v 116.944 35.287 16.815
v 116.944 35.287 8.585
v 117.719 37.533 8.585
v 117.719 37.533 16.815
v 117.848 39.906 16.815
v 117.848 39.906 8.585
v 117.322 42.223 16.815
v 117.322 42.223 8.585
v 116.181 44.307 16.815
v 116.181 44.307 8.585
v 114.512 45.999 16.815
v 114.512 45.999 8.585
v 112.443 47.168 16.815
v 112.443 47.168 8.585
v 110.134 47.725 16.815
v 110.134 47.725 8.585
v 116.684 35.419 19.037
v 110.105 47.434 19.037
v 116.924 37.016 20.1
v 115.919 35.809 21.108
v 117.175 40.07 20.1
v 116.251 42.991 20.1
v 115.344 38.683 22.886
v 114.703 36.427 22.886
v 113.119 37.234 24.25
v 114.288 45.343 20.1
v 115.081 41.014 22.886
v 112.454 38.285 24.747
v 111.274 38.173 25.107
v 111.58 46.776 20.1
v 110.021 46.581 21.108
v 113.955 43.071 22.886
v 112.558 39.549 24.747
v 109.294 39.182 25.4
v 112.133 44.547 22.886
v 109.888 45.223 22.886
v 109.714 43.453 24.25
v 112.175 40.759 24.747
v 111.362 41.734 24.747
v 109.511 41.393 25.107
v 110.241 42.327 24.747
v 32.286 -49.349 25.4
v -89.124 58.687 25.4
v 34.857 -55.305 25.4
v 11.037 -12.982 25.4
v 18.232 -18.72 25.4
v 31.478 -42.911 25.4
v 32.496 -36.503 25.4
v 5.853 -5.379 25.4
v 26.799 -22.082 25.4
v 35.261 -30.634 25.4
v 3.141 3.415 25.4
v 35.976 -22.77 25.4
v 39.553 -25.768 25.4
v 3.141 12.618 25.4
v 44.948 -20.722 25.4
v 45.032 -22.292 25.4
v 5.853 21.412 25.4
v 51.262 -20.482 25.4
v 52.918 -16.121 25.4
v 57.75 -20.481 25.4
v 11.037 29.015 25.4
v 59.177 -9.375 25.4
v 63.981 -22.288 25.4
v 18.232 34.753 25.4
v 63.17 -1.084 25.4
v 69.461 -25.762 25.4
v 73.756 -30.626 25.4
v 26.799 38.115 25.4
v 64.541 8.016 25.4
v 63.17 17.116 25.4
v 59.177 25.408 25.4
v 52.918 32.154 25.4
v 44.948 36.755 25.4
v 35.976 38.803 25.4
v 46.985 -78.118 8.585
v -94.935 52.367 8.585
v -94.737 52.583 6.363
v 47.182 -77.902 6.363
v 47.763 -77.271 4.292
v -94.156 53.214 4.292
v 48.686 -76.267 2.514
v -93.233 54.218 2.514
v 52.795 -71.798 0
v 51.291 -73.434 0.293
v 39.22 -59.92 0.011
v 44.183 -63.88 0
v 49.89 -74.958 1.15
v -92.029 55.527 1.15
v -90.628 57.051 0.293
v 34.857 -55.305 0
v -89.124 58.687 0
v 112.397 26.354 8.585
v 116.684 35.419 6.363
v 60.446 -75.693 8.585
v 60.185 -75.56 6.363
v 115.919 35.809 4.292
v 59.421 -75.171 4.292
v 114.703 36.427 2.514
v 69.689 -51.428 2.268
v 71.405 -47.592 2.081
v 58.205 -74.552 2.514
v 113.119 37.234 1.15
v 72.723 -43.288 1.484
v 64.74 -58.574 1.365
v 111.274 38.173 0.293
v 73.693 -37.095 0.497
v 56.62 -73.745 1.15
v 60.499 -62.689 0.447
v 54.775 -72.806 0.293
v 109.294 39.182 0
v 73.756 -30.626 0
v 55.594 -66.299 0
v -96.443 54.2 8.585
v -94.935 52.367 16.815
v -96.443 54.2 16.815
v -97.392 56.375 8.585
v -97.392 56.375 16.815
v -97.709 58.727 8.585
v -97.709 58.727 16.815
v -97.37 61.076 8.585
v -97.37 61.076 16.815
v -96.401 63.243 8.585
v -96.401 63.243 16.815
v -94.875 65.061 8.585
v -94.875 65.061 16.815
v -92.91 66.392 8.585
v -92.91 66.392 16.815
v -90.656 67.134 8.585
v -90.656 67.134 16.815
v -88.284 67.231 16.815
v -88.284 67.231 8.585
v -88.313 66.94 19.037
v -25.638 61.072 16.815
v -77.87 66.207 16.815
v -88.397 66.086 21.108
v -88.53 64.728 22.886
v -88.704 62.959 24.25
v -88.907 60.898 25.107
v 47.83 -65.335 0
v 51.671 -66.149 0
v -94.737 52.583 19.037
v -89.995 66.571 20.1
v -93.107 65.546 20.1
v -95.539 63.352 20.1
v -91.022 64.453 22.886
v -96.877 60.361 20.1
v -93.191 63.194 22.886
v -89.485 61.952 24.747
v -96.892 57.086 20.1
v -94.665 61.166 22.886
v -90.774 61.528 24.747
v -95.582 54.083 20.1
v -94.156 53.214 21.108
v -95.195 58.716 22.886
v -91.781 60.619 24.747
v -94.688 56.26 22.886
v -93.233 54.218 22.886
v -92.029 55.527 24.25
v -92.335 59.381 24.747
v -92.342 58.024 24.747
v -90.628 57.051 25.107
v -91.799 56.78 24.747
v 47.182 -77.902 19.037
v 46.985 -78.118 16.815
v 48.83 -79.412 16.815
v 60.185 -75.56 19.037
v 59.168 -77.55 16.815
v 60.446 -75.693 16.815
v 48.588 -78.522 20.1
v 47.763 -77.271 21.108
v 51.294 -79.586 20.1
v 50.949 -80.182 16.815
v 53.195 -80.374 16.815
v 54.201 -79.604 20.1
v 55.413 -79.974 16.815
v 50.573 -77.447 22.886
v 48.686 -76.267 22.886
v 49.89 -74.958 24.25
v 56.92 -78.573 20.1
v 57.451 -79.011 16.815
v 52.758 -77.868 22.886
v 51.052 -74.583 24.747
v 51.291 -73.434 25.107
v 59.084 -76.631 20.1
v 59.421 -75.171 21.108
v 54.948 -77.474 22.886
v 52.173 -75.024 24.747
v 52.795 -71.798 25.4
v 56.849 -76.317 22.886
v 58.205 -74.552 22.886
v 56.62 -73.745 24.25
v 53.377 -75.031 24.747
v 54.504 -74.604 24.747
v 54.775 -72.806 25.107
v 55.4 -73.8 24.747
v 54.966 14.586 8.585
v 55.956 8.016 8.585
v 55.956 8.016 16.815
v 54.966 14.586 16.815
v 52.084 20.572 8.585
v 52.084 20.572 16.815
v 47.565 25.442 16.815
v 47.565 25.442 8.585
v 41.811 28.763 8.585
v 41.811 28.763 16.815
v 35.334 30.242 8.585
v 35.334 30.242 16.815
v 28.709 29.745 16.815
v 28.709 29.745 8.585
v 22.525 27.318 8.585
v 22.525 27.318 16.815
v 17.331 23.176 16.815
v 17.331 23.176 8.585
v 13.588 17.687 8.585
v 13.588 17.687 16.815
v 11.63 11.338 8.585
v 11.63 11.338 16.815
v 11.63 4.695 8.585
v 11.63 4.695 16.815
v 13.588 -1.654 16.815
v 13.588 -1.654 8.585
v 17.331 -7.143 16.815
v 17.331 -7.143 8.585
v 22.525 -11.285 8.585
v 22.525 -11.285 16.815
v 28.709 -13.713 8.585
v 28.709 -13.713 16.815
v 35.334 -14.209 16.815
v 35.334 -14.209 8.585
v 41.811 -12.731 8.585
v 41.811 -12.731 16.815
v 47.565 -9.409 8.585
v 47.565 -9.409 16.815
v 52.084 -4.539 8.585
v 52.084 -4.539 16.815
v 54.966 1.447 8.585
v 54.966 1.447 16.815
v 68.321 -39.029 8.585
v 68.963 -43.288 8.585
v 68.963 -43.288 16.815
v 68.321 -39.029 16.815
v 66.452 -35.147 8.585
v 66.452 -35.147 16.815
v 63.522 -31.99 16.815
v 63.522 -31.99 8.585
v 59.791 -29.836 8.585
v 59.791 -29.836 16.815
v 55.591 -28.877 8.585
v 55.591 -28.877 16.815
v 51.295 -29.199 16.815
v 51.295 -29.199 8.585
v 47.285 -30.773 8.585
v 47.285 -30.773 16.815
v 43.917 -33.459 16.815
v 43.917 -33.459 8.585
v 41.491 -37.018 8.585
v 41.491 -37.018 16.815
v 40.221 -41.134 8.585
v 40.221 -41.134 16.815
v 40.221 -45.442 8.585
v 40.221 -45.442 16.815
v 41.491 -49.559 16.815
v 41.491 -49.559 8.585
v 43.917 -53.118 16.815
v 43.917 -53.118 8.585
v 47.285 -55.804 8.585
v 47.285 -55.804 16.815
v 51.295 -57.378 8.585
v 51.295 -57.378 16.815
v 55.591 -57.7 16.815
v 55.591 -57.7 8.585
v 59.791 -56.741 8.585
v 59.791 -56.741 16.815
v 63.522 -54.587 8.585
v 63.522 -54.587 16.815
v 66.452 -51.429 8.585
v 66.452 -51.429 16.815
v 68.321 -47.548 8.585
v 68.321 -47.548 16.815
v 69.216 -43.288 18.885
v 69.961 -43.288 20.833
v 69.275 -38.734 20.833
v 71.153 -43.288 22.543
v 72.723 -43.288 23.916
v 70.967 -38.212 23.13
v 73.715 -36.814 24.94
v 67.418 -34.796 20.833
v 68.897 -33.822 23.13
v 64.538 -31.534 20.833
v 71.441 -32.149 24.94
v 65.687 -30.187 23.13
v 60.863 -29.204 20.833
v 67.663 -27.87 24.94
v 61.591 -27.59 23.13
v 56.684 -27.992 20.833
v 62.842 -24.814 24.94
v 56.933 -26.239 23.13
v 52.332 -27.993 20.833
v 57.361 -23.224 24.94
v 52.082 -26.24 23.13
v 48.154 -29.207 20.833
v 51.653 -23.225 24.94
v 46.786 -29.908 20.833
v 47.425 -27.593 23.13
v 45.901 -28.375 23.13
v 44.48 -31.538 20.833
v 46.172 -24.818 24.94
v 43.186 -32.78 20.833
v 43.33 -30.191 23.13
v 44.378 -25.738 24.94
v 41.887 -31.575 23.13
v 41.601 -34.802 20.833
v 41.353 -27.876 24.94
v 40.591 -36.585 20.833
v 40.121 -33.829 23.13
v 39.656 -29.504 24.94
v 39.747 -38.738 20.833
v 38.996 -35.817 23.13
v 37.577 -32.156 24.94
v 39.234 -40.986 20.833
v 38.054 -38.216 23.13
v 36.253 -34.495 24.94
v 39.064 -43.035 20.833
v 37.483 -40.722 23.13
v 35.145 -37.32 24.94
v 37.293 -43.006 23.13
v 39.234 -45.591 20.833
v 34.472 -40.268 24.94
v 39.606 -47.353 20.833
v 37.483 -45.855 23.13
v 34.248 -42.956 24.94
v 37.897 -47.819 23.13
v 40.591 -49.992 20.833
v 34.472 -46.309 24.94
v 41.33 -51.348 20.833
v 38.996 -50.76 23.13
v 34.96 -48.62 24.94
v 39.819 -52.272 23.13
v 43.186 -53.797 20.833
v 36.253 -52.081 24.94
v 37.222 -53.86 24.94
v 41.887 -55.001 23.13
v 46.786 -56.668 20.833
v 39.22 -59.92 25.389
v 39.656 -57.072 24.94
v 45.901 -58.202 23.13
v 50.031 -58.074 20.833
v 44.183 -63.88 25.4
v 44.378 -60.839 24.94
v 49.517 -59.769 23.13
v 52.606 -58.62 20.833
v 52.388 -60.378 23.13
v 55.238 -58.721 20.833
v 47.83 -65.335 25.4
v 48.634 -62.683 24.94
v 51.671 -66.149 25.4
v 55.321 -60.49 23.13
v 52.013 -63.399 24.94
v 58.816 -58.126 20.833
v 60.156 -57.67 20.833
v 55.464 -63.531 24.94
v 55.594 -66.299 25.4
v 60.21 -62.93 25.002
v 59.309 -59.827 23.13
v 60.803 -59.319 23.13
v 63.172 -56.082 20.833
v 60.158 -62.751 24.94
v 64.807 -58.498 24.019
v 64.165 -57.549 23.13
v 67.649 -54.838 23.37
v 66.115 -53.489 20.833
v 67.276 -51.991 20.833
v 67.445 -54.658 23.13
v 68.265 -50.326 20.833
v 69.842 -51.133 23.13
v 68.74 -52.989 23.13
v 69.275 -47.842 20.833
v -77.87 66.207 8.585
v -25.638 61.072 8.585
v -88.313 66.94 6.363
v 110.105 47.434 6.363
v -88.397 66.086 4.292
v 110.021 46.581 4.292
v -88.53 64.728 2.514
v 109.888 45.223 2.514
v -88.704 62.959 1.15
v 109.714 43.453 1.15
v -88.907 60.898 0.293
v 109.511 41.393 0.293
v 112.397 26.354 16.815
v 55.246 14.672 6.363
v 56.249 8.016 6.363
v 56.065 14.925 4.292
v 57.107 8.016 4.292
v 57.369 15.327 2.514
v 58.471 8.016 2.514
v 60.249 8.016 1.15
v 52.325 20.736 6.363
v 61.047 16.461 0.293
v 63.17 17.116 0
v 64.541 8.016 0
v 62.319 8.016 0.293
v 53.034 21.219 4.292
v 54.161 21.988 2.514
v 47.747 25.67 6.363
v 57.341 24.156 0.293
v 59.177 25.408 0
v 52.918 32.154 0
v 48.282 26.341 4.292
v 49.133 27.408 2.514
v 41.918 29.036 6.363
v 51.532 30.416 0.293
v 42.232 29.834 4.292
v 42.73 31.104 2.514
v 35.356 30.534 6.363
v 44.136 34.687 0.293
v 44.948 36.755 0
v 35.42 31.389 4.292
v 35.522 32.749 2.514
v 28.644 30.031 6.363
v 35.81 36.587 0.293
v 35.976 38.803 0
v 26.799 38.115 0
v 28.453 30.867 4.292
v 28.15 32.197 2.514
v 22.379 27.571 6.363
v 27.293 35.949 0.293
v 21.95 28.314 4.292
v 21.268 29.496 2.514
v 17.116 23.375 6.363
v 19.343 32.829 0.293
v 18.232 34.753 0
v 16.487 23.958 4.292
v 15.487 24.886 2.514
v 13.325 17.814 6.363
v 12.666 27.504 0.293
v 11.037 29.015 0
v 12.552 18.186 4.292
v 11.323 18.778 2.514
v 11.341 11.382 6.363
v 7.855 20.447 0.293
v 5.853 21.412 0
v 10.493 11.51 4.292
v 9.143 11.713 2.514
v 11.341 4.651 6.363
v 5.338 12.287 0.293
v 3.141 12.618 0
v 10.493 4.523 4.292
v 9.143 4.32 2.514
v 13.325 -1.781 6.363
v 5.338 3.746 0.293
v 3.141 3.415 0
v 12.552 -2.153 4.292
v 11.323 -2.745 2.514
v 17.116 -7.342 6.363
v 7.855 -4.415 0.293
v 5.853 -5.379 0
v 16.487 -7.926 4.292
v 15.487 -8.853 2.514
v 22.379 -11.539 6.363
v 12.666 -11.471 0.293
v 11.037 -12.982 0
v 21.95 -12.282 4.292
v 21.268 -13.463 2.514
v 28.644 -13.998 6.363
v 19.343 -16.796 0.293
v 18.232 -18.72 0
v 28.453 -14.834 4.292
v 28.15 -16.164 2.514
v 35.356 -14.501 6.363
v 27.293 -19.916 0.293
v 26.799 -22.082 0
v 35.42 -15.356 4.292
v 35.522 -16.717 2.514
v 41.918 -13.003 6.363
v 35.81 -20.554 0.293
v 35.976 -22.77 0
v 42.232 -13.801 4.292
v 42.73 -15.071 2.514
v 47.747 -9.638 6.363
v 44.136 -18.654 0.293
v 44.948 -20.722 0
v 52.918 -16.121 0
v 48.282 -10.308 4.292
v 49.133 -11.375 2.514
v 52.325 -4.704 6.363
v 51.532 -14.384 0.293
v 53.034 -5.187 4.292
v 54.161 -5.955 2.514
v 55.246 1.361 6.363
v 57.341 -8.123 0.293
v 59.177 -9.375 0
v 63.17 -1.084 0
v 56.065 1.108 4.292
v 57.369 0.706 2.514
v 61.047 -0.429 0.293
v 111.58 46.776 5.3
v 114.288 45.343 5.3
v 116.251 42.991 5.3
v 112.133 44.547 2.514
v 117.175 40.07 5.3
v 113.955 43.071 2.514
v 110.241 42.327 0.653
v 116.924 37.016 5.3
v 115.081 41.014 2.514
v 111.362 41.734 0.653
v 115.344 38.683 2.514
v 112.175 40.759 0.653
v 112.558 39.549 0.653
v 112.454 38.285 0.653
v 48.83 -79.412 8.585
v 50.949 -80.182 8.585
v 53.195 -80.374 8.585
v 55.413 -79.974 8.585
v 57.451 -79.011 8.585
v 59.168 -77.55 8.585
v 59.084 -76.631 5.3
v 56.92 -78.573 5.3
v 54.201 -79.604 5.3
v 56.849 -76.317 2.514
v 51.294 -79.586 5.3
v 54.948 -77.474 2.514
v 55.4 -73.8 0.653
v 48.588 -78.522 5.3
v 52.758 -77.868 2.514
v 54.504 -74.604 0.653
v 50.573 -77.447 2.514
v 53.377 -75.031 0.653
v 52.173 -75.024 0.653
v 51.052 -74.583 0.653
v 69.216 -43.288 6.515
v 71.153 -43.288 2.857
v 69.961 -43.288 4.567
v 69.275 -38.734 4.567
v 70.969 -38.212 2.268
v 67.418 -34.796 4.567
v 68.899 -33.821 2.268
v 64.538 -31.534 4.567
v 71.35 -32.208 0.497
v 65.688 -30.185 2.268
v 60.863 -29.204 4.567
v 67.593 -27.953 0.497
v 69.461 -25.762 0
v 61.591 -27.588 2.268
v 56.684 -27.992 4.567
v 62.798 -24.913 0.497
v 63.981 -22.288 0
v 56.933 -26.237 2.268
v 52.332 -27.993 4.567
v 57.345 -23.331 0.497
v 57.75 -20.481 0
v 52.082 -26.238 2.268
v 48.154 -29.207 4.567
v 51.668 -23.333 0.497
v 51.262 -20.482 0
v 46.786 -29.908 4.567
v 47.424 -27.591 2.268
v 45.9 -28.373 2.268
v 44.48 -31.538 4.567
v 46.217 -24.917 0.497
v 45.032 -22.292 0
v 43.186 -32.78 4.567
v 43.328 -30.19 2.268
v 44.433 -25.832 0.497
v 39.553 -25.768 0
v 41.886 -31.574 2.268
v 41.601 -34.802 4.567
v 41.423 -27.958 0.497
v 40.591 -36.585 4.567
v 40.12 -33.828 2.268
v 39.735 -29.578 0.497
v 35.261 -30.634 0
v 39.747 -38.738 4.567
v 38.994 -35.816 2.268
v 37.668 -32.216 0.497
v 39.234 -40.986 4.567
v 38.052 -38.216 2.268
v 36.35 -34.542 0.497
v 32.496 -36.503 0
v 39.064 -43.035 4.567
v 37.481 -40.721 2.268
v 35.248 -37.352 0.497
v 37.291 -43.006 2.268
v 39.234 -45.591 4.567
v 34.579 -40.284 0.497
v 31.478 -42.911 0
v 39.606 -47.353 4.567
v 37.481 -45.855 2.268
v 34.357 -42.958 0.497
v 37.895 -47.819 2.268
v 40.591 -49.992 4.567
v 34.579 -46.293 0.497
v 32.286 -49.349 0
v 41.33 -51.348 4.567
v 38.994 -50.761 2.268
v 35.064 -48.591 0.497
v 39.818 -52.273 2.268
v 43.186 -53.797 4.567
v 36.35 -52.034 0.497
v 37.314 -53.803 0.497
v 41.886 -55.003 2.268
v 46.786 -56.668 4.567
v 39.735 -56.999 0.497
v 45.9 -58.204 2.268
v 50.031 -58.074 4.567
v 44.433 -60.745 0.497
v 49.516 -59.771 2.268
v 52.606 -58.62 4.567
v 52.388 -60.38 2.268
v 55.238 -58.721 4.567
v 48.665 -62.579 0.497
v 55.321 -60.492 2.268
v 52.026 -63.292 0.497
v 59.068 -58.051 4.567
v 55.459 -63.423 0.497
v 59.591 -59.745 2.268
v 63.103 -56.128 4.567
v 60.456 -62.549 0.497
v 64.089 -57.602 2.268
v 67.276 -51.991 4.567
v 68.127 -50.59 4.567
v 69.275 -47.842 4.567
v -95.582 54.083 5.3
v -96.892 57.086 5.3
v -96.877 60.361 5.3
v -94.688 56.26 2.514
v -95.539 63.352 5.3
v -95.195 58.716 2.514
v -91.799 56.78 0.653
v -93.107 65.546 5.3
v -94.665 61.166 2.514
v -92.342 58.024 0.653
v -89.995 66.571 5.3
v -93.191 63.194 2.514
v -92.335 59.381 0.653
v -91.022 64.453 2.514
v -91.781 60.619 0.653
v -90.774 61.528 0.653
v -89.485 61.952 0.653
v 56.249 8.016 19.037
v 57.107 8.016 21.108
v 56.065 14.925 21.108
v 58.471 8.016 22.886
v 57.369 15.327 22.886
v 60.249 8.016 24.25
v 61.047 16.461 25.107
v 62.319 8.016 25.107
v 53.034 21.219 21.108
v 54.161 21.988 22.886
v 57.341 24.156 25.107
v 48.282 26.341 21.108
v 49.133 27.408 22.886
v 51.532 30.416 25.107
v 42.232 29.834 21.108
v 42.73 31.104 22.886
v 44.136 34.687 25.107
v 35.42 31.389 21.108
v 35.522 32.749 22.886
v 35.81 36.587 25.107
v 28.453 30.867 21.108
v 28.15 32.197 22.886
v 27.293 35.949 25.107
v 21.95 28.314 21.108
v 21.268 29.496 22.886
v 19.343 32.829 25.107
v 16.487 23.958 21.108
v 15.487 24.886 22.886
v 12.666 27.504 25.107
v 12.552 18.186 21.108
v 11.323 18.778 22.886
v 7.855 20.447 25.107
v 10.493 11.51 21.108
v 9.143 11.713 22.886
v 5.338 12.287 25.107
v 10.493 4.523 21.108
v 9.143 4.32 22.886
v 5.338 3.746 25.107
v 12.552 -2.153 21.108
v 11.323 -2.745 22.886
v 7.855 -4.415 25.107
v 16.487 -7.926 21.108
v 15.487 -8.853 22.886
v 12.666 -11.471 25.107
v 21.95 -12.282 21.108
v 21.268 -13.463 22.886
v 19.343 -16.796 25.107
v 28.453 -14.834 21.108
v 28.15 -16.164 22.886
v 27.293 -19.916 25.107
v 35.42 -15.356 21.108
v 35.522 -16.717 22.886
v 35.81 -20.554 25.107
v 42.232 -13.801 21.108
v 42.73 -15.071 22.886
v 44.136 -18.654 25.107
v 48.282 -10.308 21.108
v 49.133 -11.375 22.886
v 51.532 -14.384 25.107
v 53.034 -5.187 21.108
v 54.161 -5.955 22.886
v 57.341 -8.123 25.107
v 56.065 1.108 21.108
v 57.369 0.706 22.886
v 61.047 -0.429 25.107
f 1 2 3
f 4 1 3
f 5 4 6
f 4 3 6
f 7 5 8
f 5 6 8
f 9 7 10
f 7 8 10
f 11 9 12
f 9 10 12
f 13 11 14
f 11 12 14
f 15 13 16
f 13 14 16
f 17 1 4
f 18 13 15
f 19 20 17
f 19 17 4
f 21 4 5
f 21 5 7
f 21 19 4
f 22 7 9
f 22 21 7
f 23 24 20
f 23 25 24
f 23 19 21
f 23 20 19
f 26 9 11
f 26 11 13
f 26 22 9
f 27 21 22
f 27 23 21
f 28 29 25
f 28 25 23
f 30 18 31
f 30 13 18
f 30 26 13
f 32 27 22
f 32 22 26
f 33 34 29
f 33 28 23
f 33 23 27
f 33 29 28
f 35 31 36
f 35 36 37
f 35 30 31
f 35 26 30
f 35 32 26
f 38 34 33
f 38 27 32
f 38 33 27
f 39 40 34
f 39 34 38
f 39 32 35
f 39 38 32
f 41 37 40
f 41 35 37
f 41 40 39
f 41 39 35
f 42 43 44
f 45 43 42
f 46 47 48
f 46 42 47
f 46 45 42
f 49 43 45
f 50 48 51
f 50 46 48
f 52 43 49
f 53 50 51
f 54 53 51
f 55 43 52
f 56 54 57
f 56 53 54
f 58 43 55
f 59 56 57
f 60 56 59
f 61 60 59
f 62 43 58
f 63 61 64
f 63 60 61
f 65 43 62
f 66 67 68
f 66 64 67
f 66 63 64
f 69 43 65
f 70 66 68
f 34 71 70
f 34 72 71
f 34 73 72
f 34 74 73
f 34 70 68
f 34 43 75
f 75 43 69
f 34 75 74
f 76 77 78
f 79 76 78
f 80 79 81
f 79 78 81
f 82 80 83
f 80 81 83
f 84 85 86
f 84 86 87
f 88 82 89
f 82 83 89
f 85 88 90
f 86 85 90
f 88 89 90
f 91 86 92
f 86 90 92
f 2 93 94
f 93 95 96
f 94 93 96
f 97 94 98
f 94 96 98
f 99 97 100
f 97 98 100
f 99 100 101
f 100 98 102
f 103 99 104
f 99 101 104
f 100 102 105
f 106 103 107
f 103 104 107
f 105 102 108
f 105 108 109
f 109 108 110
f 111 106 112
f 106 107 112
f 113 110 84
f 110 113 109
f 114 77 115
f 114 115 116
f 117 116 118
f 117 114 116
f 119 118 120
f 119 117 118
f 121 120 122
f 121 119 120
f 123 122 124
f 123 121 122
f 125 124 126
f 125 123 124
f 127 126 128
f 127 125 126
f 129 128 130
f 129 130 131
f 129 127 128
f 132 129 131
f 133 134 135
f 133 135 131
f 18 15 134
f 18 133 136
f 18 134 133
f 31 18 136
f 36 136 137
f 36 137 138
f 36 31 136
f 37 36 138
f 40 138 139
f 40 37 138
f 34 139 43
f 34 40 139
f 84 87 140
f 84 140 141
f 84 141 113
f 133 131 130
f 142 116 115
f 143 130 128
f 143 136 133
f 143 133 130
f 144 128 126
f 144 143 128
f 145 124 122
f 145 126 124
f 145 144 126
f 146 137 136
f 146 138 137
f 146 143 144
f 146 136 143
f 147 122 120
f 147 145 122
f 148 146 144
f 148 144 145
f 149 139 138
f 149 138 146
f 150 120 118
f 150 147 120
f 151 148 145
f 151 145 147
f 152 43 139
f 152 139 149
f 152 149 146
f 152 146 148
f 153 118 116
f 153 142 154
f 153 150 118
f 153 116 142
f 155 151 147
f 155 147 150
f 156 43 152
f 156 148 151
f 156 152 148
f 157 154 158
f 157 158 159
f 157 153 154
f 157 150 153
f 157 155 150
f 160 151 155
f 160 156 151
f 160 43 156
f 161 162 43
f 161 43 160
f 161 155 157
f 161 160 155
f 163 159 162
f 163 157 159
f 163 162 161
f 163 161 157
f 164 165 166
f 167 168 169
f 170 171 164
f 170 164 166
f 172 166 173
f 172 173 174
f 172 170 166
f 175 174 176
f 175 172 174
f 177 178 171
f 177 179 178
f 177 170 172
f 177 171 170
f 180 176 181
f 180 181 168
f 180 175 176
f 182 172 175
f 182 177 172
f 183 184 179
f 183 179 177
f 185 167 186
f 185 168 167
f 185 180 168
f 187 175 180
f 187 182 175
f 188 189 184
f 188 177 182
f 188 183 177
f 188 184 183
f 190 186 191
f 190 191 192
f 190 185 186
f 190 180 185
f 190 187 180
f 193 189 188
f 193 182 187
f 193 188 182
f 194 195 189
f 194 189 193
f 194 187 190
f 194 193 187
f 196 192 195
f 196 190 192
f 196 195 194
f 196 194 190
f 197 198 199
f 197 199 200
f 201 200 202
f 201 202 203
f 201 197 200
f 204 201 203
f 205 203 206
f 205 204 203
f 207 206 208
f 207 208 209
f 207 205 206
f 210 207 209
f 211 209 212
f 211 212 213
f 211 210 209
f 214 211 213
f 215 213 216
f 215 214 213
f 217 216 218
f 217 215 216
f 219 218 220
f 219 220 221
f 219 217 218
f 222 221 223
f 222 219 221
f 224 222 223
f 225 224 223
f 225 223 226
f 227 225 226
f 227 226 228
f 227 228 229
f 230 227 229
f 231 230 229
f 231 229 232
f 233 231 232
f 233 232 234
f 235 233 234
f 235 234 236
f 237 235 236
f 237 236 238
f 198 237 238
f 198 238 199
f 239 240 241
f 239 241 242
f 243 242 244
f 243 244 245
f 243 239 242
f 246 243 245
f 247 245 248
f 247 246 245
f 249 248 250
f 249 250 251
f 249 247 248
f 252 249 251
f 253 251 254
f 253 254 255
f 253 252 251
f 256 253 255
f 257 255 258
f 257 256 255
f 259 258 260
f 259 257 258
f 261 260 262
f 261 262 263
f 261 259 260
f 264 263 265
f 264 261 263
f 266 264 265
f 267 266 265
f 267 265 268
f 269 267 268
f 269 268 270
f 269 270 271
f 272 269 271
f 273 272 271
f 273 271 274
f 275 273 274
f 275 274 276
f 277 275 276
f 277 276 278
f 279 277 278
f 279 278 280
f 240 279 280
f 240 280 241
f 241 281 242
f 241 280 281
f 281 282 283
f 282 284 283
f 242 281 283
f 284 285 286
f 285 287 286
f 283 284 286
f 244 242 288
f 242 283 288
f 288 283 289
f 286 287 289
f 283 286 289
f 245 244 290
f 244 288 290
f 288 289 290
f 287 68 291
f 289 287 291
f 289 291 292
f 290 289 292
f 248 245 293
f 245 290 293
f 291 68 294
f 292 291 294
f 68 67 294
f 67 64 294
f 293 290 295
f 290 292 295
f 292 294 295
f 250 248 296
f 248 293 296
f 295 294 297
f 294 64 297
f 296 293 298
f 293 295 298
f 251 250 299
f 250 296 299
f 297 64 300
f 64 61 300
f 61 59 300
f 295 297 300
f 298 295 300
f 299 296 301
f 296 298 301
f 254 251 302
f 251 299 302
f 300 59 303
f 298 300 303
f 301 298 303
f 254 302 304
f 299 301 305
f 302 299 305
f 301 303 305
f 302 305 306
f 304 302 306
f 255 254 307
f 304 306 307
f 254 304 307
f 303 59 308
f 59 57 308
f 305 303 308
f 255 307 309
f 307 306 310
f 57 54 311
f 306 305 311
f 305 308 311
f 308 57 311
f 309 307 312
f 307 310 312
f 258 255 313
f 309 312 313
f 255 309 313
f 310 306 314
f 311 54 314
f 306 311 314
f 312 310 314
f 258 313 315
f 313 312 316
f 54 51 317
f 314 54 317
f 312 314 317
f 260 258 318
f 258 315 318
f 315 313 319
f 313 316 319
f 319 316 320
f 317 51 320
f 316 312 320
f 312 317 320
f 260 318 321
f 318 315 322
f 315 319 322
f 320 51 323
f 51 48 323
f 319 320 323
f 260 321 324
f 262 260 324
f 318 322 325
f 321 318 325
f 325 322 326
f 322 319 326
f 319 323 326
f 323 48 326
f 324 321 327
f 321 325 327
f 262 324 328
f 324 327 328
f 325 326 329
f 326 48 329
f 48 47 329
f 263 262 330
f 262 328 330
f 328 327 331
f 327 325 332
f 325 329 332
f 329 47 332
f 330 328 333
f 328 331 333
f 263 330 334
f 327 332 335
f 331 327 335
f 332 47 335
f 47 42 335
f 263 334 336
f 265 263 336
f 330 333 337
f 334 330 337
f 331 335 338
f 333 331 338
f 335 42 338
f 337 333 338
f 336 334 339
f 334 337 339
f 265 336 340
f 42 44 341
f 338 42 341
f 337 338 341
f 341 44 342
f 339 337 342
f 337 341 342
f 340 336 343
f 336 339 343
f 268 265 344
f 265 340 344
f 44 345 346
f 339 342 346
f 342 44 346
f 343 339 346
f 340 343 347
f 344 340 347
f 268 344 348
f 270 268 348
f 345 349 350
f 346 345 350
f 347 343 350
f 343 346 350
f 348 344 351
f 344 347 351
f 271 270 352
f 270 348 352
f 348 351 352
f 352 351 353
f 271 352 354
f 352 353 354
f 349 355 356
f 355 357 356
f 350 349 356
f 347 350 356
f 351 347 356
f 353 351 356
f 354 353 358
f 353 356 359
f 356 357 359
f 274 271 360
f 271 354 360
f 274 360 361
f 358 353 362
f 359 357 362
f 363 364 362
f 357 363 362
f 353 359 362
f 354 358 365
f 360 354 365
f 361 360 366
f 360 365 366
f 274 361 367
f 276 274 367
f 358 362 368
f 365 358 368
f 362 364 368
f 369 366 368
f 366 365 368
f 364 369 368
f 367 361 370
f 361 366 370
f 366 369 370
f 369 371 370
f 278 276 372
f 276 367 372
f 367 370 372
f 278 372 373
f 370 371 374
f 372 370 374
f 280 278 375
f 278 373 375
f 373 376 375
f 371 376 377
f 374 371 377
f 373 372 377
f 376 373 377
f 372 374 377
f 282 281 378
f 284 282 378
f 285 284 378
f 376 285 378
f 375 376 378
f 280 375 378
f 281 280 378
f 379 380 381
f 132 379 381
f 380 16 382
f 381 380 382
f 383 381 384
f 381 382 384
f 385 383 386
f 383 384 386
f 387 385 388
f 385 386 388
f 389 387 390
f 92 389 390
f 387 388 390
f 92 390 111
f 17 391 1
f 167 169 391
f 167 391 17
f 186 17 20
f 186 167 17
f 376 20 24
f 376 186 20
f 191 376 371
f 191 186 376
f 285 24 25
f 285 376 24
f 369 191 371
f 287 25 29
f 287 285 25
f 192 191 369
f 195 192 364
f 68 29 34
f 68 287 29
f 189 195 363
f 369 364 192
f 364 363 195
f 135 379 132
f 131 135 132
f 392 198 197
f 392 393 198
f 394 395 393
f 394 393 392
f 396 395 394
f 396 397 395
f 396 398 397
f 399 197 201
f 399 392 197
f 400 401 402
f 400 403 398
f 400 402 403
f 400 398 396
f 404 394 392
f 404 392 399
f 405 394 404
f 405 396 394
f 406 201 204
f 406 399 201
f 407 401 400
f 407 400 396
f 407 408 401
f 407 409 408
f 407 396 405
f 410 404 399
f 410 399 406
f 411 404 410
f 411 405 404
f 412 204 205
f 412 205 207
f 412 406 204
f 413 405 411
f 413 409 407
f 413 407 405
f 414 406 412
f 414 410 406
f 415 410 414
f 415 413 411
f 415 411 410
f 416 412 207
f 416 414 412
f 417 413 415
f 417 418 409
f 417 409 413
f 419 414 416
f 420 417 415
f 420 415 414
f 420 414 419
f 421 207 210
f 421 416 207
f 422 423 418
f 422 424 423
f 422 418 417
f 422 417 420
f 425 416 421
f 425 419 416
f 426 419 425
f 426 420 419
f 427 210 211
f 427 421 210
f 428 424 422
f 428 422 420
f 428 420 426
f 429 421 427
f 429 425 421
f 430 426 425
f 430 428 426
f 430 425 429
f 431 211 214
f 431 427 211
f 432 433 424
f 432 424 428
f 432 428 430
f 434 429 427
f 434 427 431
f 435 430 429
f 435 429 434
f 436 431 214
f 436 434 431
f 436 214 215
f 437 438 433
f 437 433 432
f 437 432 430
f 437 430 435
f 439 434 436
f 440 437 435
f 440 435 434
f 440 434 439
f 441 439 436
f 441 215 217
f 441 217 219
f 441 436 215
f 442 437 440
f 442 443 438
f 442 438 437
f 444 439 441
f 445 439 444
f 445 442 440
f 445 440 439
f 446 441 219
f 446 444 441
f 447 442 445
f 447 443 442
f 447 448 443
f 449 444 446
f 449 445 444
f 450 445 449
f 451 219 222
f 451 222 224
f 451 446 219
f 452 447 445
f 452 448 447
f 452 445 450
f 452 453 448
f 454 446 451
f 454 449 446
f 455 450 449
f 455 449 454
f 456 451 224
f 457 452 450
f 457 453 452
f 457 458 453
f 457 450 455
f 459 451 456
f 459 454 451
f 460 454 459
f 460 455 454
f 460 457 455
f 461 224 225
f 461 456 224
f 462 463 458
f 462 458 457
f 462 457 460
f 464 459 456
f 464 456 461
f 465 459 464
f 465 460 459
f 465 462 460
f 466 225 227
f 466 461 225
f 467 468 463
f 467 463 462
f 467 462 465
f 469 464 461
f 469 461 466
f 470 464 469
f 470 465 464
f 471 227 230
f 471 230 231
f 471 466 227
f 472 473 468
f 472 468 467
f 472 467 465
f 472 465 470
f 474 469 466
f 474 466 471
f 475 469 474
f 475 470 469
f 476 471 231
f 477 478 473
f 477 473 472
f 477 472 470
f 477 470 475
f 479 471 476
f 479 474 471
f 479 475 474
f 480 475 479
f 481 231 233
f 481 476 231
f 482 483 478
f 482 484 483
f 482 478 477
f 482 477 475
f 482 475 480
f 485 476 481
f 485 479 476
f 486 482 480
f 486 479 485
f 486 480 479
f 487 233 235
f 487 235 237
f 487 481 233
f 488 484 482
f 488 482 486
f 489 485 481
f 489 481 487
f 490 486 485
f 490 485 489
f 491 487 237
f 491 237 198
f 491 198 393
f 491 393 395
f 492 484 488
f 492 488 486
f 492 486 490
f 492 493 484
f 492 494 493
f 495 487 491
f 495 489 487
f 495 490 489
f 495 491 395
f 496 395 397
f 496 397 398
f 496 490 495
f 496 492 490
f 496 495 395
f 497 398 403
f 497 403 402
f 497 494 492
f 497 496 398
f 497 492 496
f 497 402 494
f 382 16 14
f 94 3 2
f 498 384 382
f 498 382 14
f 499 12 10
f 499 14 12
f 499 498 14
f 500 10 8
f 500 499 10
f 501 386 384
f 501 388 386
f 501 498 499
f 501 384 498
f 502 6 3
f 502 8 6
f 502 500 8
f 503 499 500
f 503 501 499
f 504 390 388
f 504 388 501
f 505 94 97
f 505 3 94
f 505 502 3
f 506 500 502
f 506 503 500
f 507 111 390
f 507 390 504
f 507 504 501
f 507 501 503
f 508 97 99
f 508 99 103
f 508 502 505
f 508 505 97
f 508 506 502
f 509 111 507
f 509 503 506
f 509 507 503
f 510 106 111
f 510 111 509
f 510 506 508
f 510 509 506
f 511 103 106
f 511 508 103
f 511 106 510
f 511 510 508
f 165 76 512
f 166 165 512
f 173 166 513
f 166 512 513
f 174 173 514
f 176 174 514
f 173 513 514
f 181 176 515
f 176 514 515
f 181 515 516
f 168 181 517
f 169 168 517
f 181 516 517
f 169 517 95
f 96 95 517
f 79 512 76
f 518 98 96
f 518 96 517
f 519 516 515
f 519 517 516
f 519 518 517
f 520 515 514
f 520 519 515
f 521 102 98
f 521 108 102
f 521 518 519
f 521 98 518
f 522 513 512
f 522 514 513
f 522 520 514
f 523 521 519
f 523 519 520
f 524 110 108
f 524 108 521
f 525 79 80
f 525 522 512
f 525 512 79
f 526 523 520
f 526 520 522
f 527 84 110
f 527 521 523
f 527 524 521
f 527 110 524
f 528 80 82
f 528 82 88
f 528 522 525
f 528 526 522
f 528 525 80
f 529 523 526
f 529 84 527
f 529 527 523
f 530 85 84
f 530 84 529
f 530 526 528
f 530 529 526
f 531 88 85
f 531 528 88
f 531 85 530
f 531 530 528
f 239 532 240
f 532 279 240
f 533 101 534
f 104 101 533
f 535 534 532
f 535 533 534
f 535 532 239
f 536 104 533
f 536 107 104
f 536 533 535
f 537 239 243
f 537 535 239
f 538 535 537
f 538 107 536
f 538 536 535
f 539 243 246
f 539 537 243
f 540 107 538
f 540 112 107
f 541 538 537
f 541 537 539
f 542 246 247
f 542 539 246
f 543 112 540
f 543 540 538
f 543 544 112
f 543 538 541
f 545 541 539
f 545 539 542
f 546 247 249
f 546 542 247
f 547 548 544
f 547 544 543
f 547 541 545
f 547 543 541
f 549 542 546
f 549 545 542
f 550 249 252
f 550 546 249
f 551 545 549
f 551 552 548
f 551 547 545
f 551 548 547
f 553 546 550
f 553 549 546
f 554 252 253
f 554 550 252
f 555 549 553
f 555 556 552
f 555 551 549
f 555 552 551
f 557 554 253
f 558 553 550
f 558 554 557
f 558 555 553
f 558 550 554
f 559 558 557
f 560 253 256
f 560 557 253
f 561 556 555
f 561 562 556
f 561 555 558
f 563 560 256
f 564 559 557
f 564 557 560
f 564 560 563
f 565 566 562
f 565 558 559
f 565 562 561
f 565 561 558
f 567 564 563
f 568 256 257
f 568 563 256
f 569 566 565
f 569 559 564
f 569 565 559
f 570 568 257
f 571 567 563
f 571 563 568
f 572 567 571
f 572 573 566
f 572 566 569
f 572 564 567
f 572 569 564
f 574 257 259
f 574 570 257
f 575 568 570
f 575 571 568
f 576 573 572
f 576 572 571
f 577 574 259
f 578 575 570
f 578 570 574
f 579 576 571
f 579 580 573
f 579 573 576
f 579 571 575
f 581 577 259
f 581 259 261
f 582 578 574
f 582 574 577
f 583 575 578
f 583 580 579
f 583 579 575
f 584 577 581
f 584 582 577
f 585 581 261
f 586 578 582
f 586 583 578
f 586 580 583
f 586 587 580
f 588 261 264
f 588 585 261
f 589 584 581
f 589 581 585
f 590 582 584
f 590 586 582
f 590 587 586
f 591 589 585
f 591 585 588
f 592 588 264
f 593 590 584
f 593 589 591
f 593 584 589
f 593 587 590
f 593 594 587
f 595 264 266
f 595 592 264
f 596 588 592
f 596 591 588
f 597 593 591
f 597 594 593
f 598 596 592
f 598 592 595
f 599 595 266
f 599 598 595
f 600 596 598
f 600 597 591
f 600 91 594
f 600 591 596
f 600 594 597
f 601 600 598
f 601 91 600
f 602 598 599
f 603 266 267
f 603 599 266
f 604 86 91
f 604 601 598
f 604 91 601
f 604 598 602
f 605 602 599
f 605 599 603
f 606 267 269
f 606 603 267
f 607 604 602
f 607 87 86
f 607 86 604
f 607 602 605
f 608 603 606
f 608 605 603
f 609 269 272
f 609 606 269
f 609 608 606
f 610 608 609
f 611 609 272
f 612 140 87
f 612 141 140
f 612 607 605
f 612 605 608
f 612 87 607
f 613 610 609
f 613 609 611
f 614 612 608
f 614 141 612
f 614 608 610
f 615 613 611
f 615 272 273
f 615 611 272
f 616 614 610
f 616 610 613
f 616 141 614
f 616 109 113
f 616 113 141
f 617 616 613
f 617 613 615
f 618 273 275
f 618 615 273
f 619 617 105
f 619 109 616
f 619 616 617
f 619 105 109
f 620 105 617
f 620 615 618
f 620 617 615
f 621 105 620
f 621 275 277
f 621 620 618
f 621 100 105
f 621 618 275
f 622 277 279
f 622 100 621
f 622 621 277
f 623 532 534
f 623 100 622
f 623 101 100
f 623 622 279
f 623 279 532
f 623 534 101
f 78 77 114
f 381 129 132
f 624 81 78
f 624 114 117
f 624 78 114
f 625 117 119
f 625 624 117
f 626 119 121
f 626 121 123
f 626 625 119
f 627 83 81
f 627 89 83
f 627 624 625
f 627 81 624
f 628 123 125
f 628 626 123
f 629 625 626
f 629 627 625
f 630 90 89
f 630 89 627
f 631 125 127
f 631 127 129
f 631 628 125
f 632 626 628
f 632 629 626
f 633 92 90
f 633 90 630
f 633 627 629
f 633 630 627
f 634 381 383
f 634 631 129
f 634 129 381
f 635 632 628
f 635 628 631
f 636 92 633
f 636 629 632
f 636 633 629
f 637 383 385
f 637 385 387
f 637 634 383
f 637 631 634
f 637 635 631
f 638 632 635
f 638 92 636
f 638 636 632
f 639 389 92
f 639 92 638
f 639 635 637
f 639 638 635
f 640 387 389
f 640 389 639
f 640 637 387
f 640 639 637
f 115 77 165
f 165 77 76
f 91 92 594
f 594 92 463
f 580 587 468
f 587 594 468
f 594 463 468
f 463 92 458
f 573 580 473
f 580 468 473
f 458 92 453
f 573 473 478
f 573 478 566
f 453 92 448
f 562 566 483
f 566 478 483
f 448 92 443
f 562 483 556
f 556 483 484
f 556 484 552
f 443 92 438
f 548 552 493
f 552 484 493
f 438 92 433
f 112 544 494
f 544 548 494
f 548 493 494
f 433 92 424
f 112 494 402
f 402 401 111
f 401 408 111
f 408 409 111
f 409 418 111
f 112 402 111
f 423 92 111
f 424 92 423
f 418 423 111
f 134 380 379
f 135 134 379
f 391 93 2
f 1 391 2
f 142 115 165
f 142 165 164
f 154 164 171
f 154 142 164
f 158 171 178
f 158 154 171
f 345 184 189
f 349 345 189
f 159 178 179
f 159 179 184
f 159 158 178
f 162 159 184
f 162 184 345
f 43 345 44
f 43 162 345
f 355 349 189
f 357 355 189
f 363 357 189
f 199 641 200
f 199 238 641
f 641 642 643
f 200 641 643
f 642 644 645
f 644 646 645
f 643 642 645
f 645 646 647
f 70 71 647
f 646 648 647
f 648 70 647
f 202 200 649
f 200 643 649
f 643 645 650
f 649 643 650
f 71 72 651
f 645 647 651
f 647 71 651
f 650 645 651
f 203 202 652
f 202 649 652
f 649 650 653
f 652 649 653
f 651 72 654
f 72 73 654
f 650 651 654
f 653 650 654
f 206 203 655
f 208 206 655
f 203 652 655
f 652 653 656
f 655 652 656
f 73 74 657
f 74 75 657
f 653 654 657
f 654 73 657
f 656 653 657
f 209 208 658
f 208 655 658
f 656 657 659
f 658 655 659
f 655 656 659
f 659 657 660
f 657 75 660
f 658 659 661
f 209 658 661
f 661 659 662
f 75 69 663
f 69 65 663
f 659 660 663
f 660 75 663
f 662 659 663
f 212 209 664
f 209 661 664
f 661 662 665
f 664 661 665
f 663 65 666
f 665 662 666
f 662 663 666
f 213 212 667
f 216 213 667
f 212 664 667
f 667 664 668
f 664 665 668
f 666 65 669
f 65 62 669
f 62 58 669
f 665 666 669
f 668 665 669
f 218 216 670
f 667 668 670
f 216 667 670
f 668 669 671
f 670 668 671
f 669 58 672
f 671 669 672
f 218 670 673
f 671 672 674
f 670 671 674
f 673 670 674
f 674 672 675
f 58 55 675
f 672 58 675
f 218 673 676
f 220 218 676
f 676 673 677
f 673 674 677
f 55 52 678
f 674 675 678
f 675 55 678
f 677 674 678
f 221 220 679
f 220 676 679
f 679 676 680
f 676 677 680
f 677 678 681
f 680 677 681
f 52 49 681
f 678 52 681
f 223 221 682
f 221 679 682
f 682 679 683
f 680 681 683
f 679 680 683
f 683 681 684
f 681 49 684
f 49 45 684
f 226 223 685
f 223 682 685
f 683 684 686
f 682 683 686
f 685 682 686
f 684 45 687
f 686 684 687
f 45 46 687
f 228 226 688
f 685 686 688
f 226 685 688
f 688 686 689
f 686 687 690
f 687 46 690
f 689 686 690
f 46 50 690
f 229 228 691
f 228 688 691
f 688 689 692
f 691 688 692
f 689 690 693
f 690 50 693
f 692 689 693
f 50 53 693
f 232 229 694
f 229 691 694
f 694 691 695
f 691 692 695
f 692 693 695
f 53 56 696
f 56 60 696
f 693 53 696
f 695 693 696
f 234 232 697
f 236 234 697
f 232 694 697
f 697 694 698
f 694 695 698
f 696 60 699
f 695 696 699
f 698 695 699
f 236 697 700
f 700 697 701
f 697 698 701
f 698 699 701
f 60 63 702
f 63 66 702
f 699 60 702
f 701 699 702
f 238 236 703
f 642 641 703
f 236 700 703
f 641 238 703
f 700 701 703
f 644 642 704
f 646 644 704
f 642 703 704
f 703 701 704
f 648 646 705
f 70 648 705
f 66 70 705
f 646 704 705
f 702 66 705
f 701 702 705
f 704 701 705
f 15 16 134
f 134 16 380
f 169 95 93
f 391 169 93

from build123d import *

# Parameters (mm, degrees)
F0_R         = 14.451692169
F0_R_2       = 22.2877793756
F1_DEPTH     = 25.4
F2_T1_DEPTH  = 199.3743361021
F2_T3_DEPTH  = 192.7884894302
F2_T5_DEPTH  = 8.2301131444
F2_T7_DEPTH  = 124.5333156844
F2_T12_DEPTH = 8.5849434278
F2_T18_DEPTH = 8.5849434278
F2_T24_DEPTH = 8.5849434278
F2_T30_DEPTH = 8.5849434278
F2_T36_DEPTH = 8.5849434278
F2_T42_DEPTH = 8.5849434278


# Not quite as in the source:
# - a fillet or chamfer that OpenCascade refuses, or shapes differently, is made with other operations: its cross-section is extruded or revolved along the edge and cut away or added


with BuildPart() as f1:
    # F0 (on Top) → F1 (new body)
    with BuildSketch(Plane.XY):
        with BuildLine():
            Line((-113.832257688, 69.7422921658), (55.3128607571, -85.7750177383))
            Line((55.3128607571, -85.7750177383), (98.9801470389, 0))
            ThreePointArc((98.9801470389, 0), (88.9042904179, 21.7216579157), (112.3967300467, 26.3539996064))
            Line((112.3967300467, 26.3539996064), (122.6502582431, 46.4948564768))
            Line((122.6502582431, 46.4948564768), (4.4090002775, 58.1185743213))
            ThreePointArc((4.4090002775, 58.1185743213), (-12.006964874, 45.4296421416), (-25.6377878195, 61.0723266154))
            Line((-25.6377878195, 61.0723266154), (-77.869777953, 66.2069972558))
            ThreePointArc((-77.869777953, 66.2069972558), (-87.4993555937, 58.3520393661), (-95.4150132583, 67.9317832418))
            Line((-95.4150132583, 67.9317832418), (-113.832257688, 69.7422921658))
        make_face()
        with Locations((54.5112267137, -43.2883314788)):
            Circle(F0_R, mode=Mode.SUBTRACT)
        with Locations((33.6687006056, 8.0163478851)):
            Circle(F0_R_2, mode=Mode.SUBTRACT)
        with BuildLine():
            ThreePointArc((112.3967300467, 26.3539996064), (88.9042904179, 21.7216579157), (98.9801470389, 0))
            Line((98.9801470389, 0), (112.3967300467, 26.3539996064))
        make_face()
        with BuildLine():
            Line((-77.869777953, 66.2069972558), (-95.4150132583, 67.9317832418))
            ThreePointArc((-95.4150132583, 67.9317832418), (-87.4993555937, 58.3520393661), (-77.869777953, 66.2069972558))
        make_face()
        with BuildLine():
            ThreePointArc((-25.6377878195, 61.0723266154), (-12.006964874, 45.4296421416), (4.4090002775, 58.1185743213))
            Line((4.4090002775, 58.1185743213), (-25.6377878195, 61.0723266154))
        make_face()
    extrude(amount=F1_DEPTH)

    # F2: fillet of radius 8.5849434278 on 15 edges, made by hand

    # F2_s2 → F2_t1 (cut)
    with BuildSketch(Plane(origin=(104.4327323095, -10.2662694476, 0), x_dir=(0, 0, 1), z_dir=(-0.9952027962, 0.0978335033, 0))):
        with BuildLine():
            ThreePointArc((16.8150565722, 58.2711156209), (22.8855282861, 55.756643907), (25.4, 49.6861721931))
            Line((25.4, 49.6861721931), (25.4, 58.2711156209))
            Line((25.4, 58.2711156209), (16.8150565722, 58.2711156209))
        make_face()
        with BuildLine():
            ThreePointArc((8.5849434278, 58.2711156209), (2.5144717139, 55.756643907), (0, 49.6861721931))
            Line((0, 49.6861721931), (0, 58.2711156209))
            Line((0, 58.2711156209), (8.5849434278, 58.2711156209))
        make_face()
    extrude(amount=F2_T1_DEPTH, mode=Mode.SUBTRACT)

    # F2_s4 → F2_t3 (cut)
    with BuildSketch(Plane(origin=(-77.5368310442, 71.289786506, 0), x_dir=(0, 0, 1), z_dir=(0.7361395861, -0.6768297495, 0))):
        with BuildLine():
            ThreePointArc((16.8150565722, 25.7049963658), (22.8855282861, 23.1905246519), (25.4, 17.120052938))
            Line((25.4, 17.120052938), (25.4, 25.7049963658))
            Line((25.4, 25.7049963658), (16.8150565722, 25.7049963658))
        make_face()
        with BuildLine():
            ThreePointArc((8.5849434278, 25.7049963658), (2.5144717139, 23.1905246519), (0, 17.120052938))
            Line((0, 17.120052938), (0, 25.7049963658))
            Line((0, 25.7049963658), (8.5849434278, 25.7049963658))
        make_face()
    extrude(amount=F2_T3_DEPTH, mode=Mode.SUBTRACT)

    # F2_s6 → F2_t5 (cut)
    with BuildSketch(Plane.XY.offset(8.5849434278)):
        with BuildLine():
            ThreePointArc((-94.9347372949, 52.3673211207), (-96.9604906178, 62.1932723461), (-88.2842970942, 67.2307975271))
            Line((-88.2842970942, 67.2307975271), (-113.832257688, 69.7422921658))
            Line((-113.832257688, 69.7422921658), (-94.9347372949, 52.3673211207))
        make_face()
        with BuildLine():
            ThreePointArc((46.9845015181, -78.1176638834), (54.3170318204, -80.2469006514), (60.4456313968, -75.6927907406))
            Line((60.4456313968, -75.6927907406), (55.3128607571, -85.7750177383))
            Line((55.3128607571, -85.7750177383), (46.9845015181, -78.1176638834))
        make_face()
        with BuildLine():
            ThreePointArc((116.94428937, 35.2867044944), (116.8237626916, 43.3045904742), (110.1335996919, 47.725307758))
            Line((110.1335996919, 47.725307758), (122.6502582431, 46.4948564768))
            Line((122.6502582431, 46.4948564768), (116.94428937, 35.2867044944))
        make_face()
    extrude(amount=F2_T5_DEPTH, mode=Mode.SUBTRACT)

    # F2_s8 → F2_t7 (cut)
    with BuildSketch(Plane(origin=(-18.161596753, -35.6745613546, 0), x_dir=(0, 0, 1), z_dir=(0.453683078, 0.8911630966, 0))):
        with BuildLine():
            ThreePointArc((8.5849434278, 88.2074543369), (2.5144717139, 85.692982623), (0, 79.6225109091))
            Line((0, 79.6225109091), (0, 88.2074543369))
            Line((0, 88.2074543369), (8.5849434278, 88.2074543369))
        make_face()
        with BuildLine():
            ThreePointArc((16.8150565722, 88.2074543369), (22.8855282861, 85.692982623), (25.4, 79.6225109091))
            Line((25.4, 79.6225109091), (25.4, 88.2074543369))
            Line((25.4, 88.2074543369), (16.8150565722, 88.2074543369))
        make_face()
    extrude(amount=F2_T7_DEPTH, mode=Mode.SUBTRACT)


with BuildPart() as f2_tool10:
    # F2_s11 → F2_t12 (new body)
    with BuildSketch(Plane.XY.offset(16.8150565722)):
        Polygon((109.2937046007, 39.1815480531), (116.94428937, 35.2867044944), (122.6502582431, 46.4948564768), (110.1335996919, 47.725307758), align=None)
    extrude(amount=F2_T12_DEPTH)

    # F2_s13 → F2_t14 (revolve, cut)
    with BuildSketch(Plane(origin=(109.2937046007, 39.1815480531, 16.8150565722), x_dir=(-0.877123787, -0.480264367, 0), z_dir=(-0.480264367, 0.877123787, 0))):
        with BuildLine():
            ThreePointArc((0, -8.5849434278), (8.5849434278, 0), (0, 8.5849434278))
            Line((0, 8.5849434278), (0, -8.5849434278))
        make_face()
    revolve(axis=Axis((109.2937046007, 39.1815480531, 16.8150565722), (0, 0, 1)), mode=Mode.SUBTRACT)


with BuildPart() as f1_1:
    add(f1.part)

    # F2_t9: cut F2_tool10
    add(f2_tool10.part, mode=Mode.SUBTRACT)


with BuildPart() as f2_tool16:
    # F2_s17 → F2_t18 (new body)
    with BuildSketch(Plane.XY.offset(16.8150565722)):
        Polygon((-89.1241921853, 58.6870378223), (-94.9347372949, 52.3673211207), (-113.832257688, 69.7422921658), (-88.2842970942, 67.2307975271), align=None)
    extrude(amount=F2_T18_DEPTH)

    # F2_s19 → F2_t20 (revolve, cut)
    with BuildSketch(Plane(origin=(-89.1241921853, 58.6870378223, 16.8150565722), x_dir=(0.912795582, -0.4084167302, 0), z_dir=(-0.4084167302, -0.912795582, 0))):
        with BuildLine():
            ThreePointArc((0, -8.5849434278), (8.5849434278, 0), (0, 8.5849434278))
            Line((0, 8.5849434278), (0, -8.5849434278))
        make_face()
    revolve(axis=Axis((-89.1241921853, 58.6870378223, 16.8150565722), (0, 0, 1)), mode=Mode.SUBTRACT)


with BuildPart() as f1_2:
    add(f1_1.part)

    # F2_t15: cut F2_tool16
    add(f2_tool16.part, mode=Mode.SUBTRACT)


with BuildPart() as f2_tool22:
    # F2_s23 → F2_t24 (new body)
    with BuildSketch(Plane.XY.offset(16.8150565722)):
        Polygon((52.7950466276, -71.7979471818), (46.9845015181, -78.1176638834), (55.3128607571, -85.7750177383), (60.4456313968, -75.6927907406), align=None)
    extrude(amount=F2_T24_DEPTH)

    # F2_s25 → F2_t26 (revolve, cut)
    with BuildSketch(Plane(origin=(52.7950466276, -71.7979471818, 16.8150565722), x_dir=(-0.1772854074, 0.9841594811, 0), z_dir=(0.9841594811, 0.1772854074, 0))):
        with BuildLine():
            ThreePointArc((0, -8.5849434278), (8.5849434278, 0), (0, 8.5849434278))
            Line((0, 8.5849434278), (0, -8.5849434278))
        make_face()
    revolve(axis=Axis((52.7950466276, -71.7979471818, 16.8150565722), (0, 0, 1)), mode=Mode.SUBTRACT)


with BuildPart() as f1_3:
    add(f1_2.part)

    # F2_t21: cut F2_tool22
    add(f2_tool22.part, mode=Mode.SUBTRACT)


with BuildPart() as f2_tool28:
    # F2_s29 → F2_t30 (new body)
    with BuildSketch(Plane.XY.offset(8.5849434278)):
        Polygon((-89.1241921853, 58.6870378223), (-94.9347372949, 52.3673211207), (-113.832257688, 69.7422921658), (-88.2842970942, 67.2307975271), align=None)
    extrude(amount=-F2_T30_DEPTH)

    # F2_s31 → F2_t32 (revolve, cut)
    with BuildSketch(Plane(origin=(-89.1241921853, 58.6870378223, 8.5849434278), x_dir=(0.912795582, -0.4084167302, 0), z_dir=(0.4084167302, 0.912795582, 0))):
        with BuildLine():
            ThreePointArc((0, -8.5849434278), (8.5849434278, 0), (0, 8.5849434278))
            Line((0, 8.5849434278), (0, -8.5849434278))
        make_face()
    revolve(axis=Axis((-89.1241921853, 58.6870378223, 8.5849434278), (0, 0, -1)), mode=Mode.SUBTRACT)


with BuildPart() as f1_4:
    add(f1_3.part)

    # F2_t27: cut F2_tool28
    add(f2_tool28.part, mode=Mode.SUBTRACT)


with BuildPart() as f2_tool34:
    # F2_s35 → F2_t36 (new body)
    with BuildSketch(Plane.XY.offset(8.5849434278)):
        Polygon((52.7950466276, -71.7979471818), (46.9845015181, -78.1176638834), (55.3128607571, -85.7750177383), (60.4456313968, -75.6927907406), align=None)
    extrude(amount=-F2_T36_DEPTH)

    # F2_s37 → F2_t38 (revolve, cut)
    with BuildSketch(Plane(origin=(52.7950466276, -71.7979471818, 8.5849434278), x_dir=(-0.1772854074, 0.9841594811, 0), z_dir=(-0.9841594811, -0.1772854074, 0))):
        with BuildLine():
            ThreePointArc((0, -8.5849434278), (8.5849434278, 0), (0, 8.5849434278))
            Line((0, 8.5849434278), (0, -8.5849434278))
        make_face()
    revolve(axis=Axis((52.7950466276, -71.7979471818, 8.5849434278), (0, 0, -1)), mode=Mode.SUBTRACT)


with BuildPart() as f1_5:
    add(f1_4.part)

    # F2_t33: cut F2_tool34
    add(f2_tool34.part, mode=Mode.SUBTRACT)


with BuildPart() as f2_tool40:
    # F2_s41 → F2_t42 (new body)
    with BuildSketch(Plane.XY.offset(8.5849434278)):
        Polygon((109.2937046007, 39.1815480531), (116.94428937, 35.2867044944), (122.6502582431, 46.4948564768), (110.1335996919, 47.725307758), align=None)
    extrude(amount=-F2_T42_DEPTH)

    # F2_s43 → F2_t44 (revolve, cut)
    with BuildSketch(Plane(origin=(109.2937046007, 39.1815480531, 8.5849434278), x_dir=(-0.877123787, -0.480264367, 0), z_dir=(0.480264367, -0.877123787, 0))):
        with BuildLine():
            ThreePointArc((0, -8.5849434278), (8.5849434278, 0), (0, 8.5849434278))
            Line((0, 8.5849434278), (0, -8.5849434278))
        make_face()
    revolve(axis=Axis((109.2937046007, 39.1815480531, 8.5849434278), (0, 0, -1)), mode=Mode.SUBTRACT)


with BuildPart() as f1_6:
    add(f1_5.part)

    # F2_t39: cut F2_tool40
    add(f2_tool40.part, mode=Mode.SUBTRACT)

    # F2_s45 → F2_t46 (revolve, cut)
    with BuildSketch(Plane.XZ.offset(43.2883314788)):
        with BuildLine():
            ThreePointArc((68.9629188827, 8.5849434278), (71.4773905966, 2.5144717139), (77.5478623105, 0))
            Line((77.5478623105, 0), (68.9629188827, 0))
            Line((68.9629188827, 0), (68.9629188827, 8.5849434278))
        make_face()
    revolve(axis=Axis((54.5112267137, -43.2883314788, 0), (0, 0, 1)), mode=Mode.SUBTRACT)

    # F2_s47 → F2_t48 (revolve, cut)
    with BuildSketch(Plane.XZ.offset(-8.0163478851)):
        with BuildLine():
            ThreePointArc((55.9564799812, 8.5849434278), (58.4709516951, 2.5144717139), (64.541423409, 0))
            Line((64.541423409, 0), (55.9564799812, 0))
            Line((55.9564799812, 0), (55.9564799812, 8.5849434278))
        make_face()
    revolve(axis=Axis((33.6687006056, 8.0163478851, 0), (0, 0, 1)), mode=Mode.SUBTRACT)

    # F2_s49 → F2_t50 (revolve, cut)
    with BuildSketch(Plane.XZ.offset(43.2883314788)):
        with BuildLine():
            ThreePointArc((68.9629188827, 16.8150565722), (71.4773905966, 22.8855282861), (77.5478623105, 25.4))
            Line((77.5478623105, 25.4), (68.9629188827, 25.4))
            Line((68.9629188827, 25.4), (68.9629188827, 16.8150565722))
        make_face()
    revolve(axis=Axis((54.5112267137, -43.2883314788, 25.4), (0, 0, 1)), mode=Mode.SUBTRACT)

    # F2_s51 → F2_t52 (revolve, cut)
    with BuildSketch(Plane.XZ.offset(-8.0163478851)):
        with BuildLine():
            ThreePointArc((55.9564799812, 16.8150565722), (58.4709516951, 22.8855282861), (64.541423409, 25.4))
            Line((64.541423409, 25.4), (55.9564799812, 25.4))
            Line((55.9564799812, 25.4), (55.9564799812, 16.8150565722))
        make_face()
    revolve(axis=Axis((33.6687006056, 8.0163478851, 25.4), (0, 0, 1)), mode=Mode.SUBTRACT)


solid = f1_6.part
